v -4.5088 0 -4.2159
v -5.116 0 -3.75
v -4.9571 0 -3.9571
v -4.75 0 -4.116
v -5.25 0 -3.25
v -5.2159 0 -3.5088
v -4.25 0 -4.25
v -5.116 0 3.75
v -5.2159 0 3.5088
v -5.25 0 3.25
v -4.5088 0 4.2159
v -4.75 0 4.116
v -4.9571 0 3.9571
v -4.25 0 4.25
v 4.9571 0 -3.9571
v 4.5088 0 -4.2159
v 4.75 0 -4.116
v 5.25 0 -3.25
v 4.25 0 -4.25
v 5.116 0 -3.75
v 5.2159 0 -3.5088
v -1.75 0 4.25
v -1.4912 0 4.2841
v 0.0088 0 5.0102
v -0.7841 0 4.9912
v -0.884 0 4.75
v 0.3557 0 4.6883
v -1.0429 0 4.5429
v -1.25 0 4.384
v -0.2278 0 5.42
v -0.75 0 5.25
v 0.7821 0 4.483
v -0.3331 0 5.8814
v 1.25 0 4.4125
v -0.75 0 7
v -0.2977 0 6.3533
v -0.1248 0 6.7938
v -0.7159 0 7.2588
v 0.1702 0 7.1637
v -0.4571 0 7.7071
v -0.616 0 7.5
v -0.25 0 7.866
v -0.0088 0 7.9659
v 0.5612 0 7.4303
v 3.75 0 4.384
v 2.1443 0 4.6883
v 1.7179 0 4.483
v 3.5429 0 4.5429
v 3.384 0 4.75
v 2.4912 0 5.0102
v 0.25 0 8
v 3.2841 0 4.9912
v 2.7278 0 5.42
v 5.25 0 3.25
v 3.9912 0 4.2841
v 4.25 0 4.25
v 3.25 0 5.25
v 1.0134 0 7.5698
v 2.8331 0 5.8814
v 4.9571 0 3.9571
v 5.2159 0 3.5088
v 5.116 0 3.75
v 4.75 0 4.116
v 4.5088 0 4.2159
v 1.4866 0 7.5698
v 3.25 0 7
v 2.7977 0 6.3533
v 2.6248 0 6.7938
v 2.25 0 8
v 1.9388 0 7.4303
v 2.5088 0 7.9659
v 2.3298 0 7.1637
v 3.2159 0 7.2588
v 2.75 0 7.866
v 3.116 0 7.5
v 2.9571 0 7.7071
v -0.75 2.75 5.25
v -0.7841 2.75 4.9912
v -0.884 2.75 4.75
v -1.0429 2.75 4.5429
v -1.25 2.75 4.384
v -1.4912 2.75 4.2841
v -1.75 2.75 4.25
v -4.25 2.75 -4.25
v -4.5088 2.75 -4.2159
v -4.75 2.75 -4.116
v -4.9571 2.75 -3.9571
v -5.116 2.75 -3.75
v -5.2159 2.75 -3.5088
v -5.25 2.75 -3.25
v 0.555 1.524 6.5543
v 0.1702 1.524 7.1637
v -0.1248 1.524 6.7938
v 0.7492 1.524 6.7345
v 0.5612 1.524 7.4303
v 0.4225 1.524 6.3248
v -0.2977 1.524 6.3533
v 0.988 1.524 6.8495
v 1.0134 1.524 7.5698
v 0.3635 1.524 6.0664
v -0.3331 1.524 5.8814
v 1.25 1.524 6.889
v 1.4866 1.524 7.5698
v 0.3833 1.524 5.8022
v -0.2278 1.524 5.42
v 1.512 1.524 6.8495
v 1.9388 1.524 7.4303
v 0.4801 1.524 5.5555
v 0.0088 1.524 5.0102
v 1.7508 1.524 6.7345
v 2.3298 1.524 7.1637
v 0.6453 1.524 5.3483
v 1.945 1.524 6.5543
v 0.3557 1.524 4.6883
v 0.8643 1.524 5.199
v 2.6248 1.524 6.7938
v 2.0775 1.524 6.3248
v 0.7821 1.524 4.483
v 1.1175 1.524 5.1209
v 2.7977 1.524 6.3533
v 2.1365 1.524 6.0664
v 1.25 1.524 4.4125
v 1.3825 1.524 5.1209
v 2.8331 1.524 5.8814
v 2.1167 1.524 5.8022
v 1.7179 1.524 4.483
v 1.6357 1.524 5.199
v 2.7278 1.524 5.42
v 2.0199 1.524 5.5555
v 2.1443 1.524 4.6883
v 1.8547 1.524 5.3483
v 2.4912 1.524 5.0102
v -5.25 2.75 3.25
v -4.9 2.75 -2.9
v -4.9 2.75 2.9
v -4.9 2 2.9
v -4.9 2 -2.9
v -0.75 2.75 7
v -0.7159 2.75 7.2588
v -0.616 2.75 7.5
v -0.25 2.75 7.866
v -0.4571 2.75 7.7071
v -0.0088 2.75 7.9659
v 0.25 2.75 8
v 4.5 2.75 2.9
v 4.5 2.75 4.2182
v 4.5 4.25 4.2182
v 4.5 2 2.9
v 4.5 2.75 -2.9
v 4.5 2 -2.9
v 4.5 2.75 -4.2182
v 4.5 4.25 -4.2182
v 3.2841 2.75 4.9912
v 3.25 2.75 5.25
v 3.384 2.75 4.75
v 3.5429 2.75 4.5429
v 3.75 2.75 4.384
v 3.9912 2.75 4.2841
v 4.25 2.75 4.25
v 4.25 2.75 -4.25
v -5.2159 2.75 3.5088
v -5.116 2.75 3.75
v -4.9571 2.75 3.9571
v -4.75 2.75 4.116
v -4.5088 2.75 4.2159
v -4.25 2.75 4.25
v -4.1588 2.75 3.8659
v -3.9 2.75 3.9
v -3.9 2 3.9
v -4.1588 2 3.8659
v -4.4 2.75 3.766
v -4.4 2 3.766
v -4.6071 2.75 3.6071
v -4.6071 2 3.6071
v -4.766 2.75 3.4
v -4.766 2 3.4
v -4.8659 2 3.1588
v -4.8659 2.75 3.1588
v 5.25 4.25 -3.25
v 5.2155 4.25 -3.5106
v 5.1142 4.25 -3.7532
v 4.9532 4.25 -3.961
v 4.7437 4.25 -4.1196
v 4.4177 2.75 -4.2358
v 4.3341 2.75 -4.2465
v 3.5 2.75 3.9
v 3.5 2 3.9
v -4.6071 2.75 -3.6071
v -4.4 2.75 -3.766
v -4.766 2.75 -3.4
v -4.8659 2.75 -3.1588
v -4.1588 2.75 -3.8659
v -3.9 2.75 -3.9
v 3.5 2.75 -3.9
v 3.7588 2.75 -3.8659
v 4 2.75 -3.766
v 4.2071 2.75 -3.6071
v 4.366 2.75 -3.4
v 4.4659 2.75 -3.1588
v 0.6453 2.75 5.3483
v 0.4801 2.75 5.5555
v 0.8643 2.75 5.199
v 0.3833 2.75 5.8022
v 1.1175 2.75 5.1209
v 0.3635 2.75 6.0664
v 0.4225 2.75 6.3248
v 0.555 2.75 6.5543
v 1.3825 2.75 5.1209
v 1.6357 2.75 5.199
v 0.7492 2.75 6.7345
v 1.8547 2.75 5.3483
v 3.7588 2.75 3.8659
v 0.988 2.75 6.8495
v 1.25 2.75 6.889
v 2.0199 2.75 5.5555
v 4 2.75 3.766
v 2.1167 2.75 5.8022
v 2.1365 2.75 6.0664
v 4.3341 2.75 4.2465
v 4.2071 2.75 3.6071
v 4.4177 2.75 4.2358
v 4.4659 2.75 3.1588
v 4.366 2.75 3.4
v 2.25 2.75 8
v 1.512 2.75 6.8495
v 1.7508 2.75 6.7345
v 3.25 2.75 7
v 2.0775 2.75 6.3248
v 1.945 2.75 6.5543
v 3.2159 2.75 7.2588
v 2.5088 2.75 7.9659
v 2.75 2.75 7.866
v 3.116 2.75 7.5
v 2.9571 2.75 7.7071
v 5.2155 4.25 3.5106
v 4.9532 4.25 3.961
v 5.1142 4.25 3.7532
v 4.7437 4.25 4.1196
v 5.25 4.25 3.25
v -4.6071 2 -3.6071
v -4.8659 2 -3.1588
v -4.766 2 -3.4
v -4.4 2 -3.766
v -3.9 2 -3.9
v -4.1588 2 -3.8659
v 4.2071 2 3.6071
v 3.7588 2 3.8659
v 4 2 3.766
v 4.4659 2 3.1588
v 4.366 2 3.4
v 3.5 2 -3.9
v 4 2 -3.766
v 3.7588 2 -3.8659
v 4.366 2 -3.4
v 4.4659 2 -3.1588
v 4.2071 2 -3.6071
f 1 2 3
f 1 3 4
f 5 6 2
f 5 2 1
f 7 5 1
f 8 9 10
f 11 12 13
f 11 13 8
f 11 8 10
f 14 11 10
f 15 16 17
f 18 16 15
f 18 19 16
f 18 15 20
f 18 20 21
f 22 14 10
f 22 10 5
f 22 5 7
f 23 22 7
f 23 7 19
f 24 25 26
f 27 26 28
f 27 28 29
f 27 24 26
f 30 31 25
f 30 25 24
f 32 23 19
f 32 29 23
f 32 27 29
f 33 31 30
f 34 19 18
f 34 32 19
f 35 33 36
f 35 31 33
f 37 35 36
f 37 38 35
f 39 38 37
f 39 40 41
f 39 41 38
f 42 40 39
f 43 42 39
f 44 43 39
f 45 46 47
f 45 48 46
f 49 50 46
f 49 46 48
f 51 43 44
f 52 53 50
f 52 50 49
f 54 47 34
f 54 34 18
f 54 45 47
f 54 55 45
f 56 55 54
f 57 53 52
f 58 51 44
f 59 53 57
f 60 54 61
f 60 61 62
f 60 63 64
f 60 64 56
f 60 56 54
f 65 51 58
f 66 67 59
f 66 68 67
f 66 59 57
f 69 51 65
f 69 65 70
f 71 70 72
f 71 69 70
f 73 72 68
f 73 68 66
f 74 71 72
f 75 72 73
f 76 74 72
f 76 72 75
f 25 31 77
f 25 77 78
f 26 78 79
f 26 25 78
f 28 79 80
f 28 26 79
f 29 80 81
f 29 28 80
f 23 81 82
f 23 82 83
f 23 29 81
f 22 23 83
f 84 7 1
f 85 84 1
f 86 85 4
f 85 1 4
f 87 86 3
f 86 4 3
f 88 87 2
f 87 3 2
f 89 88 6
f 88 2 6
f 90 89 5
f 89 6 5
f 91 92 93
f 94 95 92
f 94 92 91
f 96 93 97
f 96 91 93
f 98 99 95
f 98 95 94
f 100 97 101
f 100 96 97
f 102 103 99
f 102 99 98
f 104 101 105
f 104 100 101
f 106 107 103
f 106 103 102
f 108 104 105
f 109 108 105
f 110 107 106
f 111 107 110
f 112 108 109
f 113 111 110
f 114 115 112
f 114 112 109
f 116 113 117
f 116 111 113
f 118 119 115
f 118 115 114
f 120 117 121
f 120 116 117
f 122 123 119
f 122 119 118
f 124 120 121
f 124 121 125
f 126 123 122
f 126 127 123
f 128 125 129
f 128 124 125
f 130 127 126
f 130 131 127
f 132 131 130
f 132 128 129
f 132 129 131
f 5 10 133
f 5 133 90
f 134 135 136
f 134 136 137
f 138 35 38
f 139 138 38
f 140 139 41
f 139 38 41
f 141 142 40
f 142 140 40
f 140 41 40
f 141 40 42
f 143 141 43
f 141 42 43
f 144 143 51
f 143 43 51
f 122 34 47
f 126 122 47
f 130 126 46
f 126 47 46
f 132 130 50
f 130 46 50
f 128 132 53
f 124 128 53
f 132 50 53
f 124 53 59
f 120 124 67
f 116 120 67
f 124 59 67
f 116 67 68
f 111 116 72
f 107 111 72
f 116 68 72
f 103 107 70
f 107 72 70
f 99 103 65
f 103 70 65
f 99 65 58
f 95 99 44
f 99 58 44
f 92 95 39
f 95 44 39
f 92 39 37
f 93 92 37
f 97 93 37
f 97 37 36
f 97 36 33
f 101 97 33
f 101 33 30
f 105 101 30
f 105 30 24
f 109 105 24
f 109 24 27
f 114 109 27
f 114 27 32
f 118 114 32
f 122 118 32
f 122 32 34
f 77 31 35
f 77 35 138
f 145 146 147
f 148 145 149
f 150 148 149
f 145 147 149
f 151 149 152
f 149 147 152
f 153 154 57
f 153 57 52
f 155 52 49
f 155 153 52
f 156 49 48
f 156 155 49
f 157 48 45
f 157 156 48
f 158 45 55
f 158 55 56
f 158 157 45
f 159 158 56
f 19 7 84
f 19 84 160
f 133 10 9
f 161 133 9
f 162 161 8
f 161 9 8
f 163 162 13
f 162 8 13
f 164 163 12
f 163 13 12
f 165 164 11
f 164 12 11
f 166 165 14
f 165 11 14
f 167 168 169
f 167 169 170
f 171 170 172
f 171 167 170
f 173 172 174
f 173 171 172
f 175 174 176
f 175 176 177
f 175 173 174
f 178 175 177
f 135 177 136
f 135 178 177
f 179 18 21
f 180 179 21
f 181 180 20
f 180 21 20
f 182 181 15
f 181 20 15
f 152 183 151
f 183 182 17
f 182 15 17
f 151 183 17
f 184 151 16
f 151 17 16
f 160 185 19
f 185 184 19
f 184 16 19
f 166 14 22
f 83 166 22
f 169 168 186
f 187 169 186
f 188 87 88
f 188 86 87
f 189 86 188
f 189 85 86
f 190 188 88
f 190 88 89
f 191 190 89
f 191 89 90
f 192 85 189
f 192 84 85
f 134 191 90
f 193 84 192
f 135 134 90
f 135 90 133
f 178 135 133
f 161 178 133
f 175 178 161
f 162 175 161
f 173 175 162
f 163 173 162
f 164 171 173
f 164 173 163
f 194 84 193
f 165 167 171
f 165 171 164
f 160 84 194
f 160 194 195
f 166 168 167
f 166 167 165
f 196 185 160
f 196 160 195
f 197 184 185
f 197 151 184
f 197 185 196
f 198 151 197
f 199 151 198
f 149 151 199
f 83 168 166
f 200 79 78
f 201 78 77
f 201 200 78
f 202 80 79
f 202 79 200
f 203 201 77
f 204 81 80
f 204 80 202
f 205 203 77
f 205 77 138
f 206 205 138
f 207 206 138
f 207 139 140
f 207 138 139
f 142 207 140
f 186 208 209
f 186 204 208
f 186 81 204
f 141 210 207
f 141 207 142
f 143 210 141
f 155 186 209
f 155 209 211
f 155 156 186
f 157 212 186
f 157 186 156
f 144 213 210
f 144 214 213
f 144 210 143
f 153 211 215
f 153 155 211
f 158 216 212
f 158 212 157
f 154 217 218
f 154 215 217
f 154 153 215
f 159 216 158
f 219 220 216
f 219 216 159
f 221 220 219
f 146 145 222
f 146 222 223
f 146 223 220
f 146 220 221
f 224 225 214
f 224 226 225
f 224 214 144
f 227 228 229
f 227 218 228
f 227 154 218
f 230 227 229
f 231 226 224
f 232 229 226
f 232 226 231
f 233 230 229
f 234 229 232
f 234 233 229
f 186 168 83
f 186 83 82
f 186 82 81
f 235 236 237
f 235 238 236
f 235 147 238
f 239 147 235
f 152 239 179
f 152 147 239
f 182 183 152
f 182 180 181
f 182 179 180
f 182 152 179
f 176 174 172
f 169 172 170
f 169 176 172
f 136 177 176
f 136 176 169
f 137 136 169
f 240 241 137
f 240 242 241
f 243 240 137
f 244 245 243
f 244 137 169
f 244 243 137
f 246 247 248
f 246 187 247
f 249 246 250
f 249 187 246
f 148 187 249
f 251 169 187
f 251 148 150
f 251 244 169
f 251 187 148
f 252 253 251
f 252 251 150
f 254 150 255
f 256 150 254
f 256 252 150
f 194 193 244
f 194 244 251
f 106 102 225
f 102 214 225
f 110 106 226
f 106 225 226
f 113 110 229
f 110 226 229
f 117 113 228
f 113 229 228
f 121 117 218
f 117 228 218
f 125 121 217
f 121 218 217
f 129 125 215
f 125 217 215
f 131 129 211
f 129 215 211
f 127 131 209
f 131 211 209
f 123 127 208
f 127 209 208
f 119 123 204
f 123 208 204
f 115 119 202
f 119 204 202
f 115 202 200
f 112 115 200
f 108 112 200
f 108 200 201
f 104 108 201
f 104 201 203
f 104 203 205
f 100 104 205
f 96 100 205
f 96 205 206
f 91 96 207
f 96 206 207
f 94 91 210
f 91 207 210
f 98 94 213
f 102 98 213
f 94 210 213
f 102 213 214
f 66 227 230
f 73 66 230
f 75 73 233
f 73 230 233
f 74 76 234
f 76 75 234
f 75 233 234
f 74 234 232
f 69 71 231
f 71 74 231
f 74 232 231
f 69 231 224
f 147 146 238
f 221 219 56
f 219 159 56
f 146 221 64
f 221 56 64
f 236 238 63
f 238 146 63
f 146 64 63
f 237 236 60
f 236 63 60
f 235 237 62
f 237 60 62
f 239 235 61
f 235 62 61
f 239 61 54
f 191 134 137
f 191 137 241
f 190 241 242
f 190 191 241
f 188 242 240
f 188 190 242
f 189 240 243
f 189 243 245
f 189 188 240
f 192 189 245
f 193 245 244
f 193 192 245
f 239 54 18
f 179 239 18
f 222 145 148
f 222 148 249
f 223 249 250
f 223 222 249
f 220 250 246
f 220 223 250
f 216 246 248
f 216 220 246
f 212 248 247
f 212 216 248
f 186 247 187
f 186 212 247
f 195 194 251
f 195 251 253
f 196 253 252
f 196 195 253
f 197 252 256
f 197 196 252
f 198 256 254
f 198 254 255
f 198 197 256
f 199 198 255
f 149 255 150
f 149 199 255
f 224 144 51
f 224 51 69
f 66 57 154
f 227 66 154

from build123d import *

# Parameters (mm, degrees)
SKETCH1_W                                      = 10.5
SKETCH1_H                                      = 8.5
EXTRUDE1_DEPTH                                 = 4.25
SKETCH3_W                                      = 9.75
SKETCH3_H                                      = 8.5
EXTRUDE4_DEPTH                                 = 1.5
SKETCH4_W                                      = 9.4
SKETCH4_H                                      = 7.8
EXTRUDE5_DEPTH                                 = 0.75
SKETCH5_W                                      = 4
SKETCH5_H                                      = 2.75
EXTRUDE6_DEPTH                                 = 3.75
CBORE_FOR_0_SOCKET_HEAD_CAP_SCREW1_D           = 1.778
CBORE_FOR_0_SOCKET_HEAD_CAP_SCREW1_CBORE_D     = 3.175
CBORE_FOR_0_SOCKET_HEAD_CAP_SCREW1_CBORE_DEPTH = 1.524
FILLET1_R                                      = 1


with BuildPart() as part:
    # Sketch1 → Extrude1 (new body)
    with BuildSketch(Plane(origin=(0, 0, 0), x_dir=(1, 0, 0), z_dir=(0, 1, 0))):
        Rectangle(SKETCH1_W, SKETCH1_H)
    extrude(amount=EXTRUDE1_DEPTH)

    # Sketch3 → Extrude4 (cut)
    with BuildSketch(Plane(origin=(0, 4.25, 0), x_dir=(1, 0, 0), z_dir=(0, 1, 0))):
        with Locations((-0.375, 0)):
            Rectangle(SKETCH3_W, SKETCH3_H)
    extrude(amount=-EXTRUDE4_DEPTH, mode=Mode.SUBTRACT)

    # Sketch4 → Extrude5 (cut)
    with BuildSketch(Plane(origin=(0, 2.75, 0), x_dir=(1, 0, 0), z_dir=(0, 1, 0))):
        with Locations((-0.2, 0)):
            Rectangle(SKETCH4_W, SKETCH4_H)
    extrude(amount=-EXTRUDE5_DEPTH, mode=Mode.SUBTRACT)

    # Sketch5 → Extrude6 (add)
    with BuildSketch(Plane.XY.offset(4.25)):
        with Locations((1.25, 1.375)):
            Rectangle(SKETCH5_W, SKETCH5_H)
    extrude(amount=EXTRUDE6_DEPTH)

    # CBORE for #0 Socket Head Cap Screw1 (through all)
    with Locations(Plane(origin=(1.25, 0, 6), x_dir=(0, 0, -1), z_dir=(0, -1, 0))):
        with Locations((0, 0)):
            CounterBoreHole(CBORE_FOR_0_SOCKET_HEAD_CAP_SCREW1_D / 2, CBORE_FOR_0_SOCKET_HEAD_CAP_SCREW1_CBORE_D / 2, CBORE_FOR_0_SOCKET_HEAD_CAP_SCREW1_CBORE_DEPTH)

    # Fillet1
    # the kernel refuses this fillet: 1 mm, written as the material it adds along each edge
    with BuildSketch(Plane(origin=(3.25, 2.75, 4.25), x_dir=(0, 0, 1), z_dir=(0, -1, 0))) as fillet1_piece_1:
        with BuildLine():
            CenterArc((FILLET1_R, -FILLET1_R), FILLET1_R, 90, 90)
            Line((0, -FILLET1_R), (0, 0))
            Line((0, 0), (FILLET1_R, 0))
        make_face()
    extrude(amount=2.75)
    with BuildSketch(Plane(origin=(-0.75, 0, 4.25), x_dir=(-1, 0, 0), z_dir=(0, 1, 0))) as fillet1_piece_2:
        with BuildLine():
            CenterArc((FILLET1_R, FILLET1_R), FILLET1_R, 180, 90)
            Line((0, FILLET1_R), (0, 0))
            Line((0, 0), (FILLET1_R, 0))
        make_face()
    extrude(amount=2.75)
    with BuildSketch(Plane(origin=(4.5, 2.75, -3.9), x_dir=(0, 0, 1), z_dir=(0, -1, 0)), Plane(origin=(-4.9, 2.75, -3.9), x_dir=(1, 0, 0), z_dir=(0, -1, 0)), Plane(origin=(-4.9, 2.75, 3.9), x_dir=(0, 0, -1), z_dir=(0, -1, 0))) as fillet1_piece_3:
        with BuildLine():
            CenterArc((FILLET1_R, FILLET1_R), FILLET1_R, 180, 90)
            Line((0, FILLET1_R), (0, 0))
            Line((0, 0), (FILLET1_R, 0))
        make_face()
    extrude(amount=0.75)
    with BuildSketch(Plane(origin=(4.5, 2.75, 3.9), x_dir=(0, 0, -1), z_dir=(0, -1, 0))) as fillet1_piece_4:
        with BuildLine():
            CenterArc((FILLET1_R, -FILLET1_R), FILLET1_R, 90, 90)
            Line((0, -FILLET1_R), (0, 0))
            Line((0, 0), (FILLET1_R, 0))
        make_face()
    extrude(amount=0.75)
    # the kernel refuses this fillet: 1 mm, written as the material it takes off along each edge
    with BuildSketch(Plane(origin=(5.25, -2.5, -4.25), x_dir=(-1, 0, 0), z_dir=(0, 1, 0)), Plane(origin=(5.25, -2.5, 4.25), x_dir=(0, 0, -1), z_dir=(0, 1, 0))) as fillet1_2_piece_1:
        with BuildLine():
            CenterArc((FILLET1_R, FILLET1_R), FILLET1_R, 180, 90)
            Line((0, FILLET1_R), (0, 0))
            Line((0, 0), (FILLET1_R, 0))
        make_face()
    extrude(amount=9.25, mode=Mode.SUBTRACT)
    with BuildSketch(Plane(origin=(3.25, 5.25, 8), x_dir=(0, 0, -1), z_dir=(0, -1, 0))) as fillet1_2_piece_2:
        with BuildLine():
            CenterArc((FILLET1_R, -FILLET1_R), FILLET1_R, 90, 90)
            Line((0, -FILLET1_R), (0, 0))
            Line((0, 0), (FILLET1_R, 0))
        make_face()
    extrude(amount=7.75, mode=Mode.SUBTRACT)
    with BuildSketch(Plane(origin=(-0.75, -2.5, 8), x_dir=(1, 0, 0), z_dir=(0, 1, 0)), Plane(origin=(-5.25, -2.5, -4.25), x_dir=(0, 0, 1), z_dir=(0, 1, 0)), Plane(origin=(-5.25, -2.5, 4.25), x_dir=(1, 0, 0), z_dir=(0, 1, 0))) as fillet1_2_piece_3:
        with BuildLine():
            CenterArc((FILLET1_R, FILLET1_R), FILLET1_R, 180, 90)
            Line((0, FILLET1_R), (0, 0))
            Line((0, 0), (FILLET1_R, 0))
        make_face()
    extrude(amount=7.75, mode=Mode.SUBTRACT)


solid = part.part
